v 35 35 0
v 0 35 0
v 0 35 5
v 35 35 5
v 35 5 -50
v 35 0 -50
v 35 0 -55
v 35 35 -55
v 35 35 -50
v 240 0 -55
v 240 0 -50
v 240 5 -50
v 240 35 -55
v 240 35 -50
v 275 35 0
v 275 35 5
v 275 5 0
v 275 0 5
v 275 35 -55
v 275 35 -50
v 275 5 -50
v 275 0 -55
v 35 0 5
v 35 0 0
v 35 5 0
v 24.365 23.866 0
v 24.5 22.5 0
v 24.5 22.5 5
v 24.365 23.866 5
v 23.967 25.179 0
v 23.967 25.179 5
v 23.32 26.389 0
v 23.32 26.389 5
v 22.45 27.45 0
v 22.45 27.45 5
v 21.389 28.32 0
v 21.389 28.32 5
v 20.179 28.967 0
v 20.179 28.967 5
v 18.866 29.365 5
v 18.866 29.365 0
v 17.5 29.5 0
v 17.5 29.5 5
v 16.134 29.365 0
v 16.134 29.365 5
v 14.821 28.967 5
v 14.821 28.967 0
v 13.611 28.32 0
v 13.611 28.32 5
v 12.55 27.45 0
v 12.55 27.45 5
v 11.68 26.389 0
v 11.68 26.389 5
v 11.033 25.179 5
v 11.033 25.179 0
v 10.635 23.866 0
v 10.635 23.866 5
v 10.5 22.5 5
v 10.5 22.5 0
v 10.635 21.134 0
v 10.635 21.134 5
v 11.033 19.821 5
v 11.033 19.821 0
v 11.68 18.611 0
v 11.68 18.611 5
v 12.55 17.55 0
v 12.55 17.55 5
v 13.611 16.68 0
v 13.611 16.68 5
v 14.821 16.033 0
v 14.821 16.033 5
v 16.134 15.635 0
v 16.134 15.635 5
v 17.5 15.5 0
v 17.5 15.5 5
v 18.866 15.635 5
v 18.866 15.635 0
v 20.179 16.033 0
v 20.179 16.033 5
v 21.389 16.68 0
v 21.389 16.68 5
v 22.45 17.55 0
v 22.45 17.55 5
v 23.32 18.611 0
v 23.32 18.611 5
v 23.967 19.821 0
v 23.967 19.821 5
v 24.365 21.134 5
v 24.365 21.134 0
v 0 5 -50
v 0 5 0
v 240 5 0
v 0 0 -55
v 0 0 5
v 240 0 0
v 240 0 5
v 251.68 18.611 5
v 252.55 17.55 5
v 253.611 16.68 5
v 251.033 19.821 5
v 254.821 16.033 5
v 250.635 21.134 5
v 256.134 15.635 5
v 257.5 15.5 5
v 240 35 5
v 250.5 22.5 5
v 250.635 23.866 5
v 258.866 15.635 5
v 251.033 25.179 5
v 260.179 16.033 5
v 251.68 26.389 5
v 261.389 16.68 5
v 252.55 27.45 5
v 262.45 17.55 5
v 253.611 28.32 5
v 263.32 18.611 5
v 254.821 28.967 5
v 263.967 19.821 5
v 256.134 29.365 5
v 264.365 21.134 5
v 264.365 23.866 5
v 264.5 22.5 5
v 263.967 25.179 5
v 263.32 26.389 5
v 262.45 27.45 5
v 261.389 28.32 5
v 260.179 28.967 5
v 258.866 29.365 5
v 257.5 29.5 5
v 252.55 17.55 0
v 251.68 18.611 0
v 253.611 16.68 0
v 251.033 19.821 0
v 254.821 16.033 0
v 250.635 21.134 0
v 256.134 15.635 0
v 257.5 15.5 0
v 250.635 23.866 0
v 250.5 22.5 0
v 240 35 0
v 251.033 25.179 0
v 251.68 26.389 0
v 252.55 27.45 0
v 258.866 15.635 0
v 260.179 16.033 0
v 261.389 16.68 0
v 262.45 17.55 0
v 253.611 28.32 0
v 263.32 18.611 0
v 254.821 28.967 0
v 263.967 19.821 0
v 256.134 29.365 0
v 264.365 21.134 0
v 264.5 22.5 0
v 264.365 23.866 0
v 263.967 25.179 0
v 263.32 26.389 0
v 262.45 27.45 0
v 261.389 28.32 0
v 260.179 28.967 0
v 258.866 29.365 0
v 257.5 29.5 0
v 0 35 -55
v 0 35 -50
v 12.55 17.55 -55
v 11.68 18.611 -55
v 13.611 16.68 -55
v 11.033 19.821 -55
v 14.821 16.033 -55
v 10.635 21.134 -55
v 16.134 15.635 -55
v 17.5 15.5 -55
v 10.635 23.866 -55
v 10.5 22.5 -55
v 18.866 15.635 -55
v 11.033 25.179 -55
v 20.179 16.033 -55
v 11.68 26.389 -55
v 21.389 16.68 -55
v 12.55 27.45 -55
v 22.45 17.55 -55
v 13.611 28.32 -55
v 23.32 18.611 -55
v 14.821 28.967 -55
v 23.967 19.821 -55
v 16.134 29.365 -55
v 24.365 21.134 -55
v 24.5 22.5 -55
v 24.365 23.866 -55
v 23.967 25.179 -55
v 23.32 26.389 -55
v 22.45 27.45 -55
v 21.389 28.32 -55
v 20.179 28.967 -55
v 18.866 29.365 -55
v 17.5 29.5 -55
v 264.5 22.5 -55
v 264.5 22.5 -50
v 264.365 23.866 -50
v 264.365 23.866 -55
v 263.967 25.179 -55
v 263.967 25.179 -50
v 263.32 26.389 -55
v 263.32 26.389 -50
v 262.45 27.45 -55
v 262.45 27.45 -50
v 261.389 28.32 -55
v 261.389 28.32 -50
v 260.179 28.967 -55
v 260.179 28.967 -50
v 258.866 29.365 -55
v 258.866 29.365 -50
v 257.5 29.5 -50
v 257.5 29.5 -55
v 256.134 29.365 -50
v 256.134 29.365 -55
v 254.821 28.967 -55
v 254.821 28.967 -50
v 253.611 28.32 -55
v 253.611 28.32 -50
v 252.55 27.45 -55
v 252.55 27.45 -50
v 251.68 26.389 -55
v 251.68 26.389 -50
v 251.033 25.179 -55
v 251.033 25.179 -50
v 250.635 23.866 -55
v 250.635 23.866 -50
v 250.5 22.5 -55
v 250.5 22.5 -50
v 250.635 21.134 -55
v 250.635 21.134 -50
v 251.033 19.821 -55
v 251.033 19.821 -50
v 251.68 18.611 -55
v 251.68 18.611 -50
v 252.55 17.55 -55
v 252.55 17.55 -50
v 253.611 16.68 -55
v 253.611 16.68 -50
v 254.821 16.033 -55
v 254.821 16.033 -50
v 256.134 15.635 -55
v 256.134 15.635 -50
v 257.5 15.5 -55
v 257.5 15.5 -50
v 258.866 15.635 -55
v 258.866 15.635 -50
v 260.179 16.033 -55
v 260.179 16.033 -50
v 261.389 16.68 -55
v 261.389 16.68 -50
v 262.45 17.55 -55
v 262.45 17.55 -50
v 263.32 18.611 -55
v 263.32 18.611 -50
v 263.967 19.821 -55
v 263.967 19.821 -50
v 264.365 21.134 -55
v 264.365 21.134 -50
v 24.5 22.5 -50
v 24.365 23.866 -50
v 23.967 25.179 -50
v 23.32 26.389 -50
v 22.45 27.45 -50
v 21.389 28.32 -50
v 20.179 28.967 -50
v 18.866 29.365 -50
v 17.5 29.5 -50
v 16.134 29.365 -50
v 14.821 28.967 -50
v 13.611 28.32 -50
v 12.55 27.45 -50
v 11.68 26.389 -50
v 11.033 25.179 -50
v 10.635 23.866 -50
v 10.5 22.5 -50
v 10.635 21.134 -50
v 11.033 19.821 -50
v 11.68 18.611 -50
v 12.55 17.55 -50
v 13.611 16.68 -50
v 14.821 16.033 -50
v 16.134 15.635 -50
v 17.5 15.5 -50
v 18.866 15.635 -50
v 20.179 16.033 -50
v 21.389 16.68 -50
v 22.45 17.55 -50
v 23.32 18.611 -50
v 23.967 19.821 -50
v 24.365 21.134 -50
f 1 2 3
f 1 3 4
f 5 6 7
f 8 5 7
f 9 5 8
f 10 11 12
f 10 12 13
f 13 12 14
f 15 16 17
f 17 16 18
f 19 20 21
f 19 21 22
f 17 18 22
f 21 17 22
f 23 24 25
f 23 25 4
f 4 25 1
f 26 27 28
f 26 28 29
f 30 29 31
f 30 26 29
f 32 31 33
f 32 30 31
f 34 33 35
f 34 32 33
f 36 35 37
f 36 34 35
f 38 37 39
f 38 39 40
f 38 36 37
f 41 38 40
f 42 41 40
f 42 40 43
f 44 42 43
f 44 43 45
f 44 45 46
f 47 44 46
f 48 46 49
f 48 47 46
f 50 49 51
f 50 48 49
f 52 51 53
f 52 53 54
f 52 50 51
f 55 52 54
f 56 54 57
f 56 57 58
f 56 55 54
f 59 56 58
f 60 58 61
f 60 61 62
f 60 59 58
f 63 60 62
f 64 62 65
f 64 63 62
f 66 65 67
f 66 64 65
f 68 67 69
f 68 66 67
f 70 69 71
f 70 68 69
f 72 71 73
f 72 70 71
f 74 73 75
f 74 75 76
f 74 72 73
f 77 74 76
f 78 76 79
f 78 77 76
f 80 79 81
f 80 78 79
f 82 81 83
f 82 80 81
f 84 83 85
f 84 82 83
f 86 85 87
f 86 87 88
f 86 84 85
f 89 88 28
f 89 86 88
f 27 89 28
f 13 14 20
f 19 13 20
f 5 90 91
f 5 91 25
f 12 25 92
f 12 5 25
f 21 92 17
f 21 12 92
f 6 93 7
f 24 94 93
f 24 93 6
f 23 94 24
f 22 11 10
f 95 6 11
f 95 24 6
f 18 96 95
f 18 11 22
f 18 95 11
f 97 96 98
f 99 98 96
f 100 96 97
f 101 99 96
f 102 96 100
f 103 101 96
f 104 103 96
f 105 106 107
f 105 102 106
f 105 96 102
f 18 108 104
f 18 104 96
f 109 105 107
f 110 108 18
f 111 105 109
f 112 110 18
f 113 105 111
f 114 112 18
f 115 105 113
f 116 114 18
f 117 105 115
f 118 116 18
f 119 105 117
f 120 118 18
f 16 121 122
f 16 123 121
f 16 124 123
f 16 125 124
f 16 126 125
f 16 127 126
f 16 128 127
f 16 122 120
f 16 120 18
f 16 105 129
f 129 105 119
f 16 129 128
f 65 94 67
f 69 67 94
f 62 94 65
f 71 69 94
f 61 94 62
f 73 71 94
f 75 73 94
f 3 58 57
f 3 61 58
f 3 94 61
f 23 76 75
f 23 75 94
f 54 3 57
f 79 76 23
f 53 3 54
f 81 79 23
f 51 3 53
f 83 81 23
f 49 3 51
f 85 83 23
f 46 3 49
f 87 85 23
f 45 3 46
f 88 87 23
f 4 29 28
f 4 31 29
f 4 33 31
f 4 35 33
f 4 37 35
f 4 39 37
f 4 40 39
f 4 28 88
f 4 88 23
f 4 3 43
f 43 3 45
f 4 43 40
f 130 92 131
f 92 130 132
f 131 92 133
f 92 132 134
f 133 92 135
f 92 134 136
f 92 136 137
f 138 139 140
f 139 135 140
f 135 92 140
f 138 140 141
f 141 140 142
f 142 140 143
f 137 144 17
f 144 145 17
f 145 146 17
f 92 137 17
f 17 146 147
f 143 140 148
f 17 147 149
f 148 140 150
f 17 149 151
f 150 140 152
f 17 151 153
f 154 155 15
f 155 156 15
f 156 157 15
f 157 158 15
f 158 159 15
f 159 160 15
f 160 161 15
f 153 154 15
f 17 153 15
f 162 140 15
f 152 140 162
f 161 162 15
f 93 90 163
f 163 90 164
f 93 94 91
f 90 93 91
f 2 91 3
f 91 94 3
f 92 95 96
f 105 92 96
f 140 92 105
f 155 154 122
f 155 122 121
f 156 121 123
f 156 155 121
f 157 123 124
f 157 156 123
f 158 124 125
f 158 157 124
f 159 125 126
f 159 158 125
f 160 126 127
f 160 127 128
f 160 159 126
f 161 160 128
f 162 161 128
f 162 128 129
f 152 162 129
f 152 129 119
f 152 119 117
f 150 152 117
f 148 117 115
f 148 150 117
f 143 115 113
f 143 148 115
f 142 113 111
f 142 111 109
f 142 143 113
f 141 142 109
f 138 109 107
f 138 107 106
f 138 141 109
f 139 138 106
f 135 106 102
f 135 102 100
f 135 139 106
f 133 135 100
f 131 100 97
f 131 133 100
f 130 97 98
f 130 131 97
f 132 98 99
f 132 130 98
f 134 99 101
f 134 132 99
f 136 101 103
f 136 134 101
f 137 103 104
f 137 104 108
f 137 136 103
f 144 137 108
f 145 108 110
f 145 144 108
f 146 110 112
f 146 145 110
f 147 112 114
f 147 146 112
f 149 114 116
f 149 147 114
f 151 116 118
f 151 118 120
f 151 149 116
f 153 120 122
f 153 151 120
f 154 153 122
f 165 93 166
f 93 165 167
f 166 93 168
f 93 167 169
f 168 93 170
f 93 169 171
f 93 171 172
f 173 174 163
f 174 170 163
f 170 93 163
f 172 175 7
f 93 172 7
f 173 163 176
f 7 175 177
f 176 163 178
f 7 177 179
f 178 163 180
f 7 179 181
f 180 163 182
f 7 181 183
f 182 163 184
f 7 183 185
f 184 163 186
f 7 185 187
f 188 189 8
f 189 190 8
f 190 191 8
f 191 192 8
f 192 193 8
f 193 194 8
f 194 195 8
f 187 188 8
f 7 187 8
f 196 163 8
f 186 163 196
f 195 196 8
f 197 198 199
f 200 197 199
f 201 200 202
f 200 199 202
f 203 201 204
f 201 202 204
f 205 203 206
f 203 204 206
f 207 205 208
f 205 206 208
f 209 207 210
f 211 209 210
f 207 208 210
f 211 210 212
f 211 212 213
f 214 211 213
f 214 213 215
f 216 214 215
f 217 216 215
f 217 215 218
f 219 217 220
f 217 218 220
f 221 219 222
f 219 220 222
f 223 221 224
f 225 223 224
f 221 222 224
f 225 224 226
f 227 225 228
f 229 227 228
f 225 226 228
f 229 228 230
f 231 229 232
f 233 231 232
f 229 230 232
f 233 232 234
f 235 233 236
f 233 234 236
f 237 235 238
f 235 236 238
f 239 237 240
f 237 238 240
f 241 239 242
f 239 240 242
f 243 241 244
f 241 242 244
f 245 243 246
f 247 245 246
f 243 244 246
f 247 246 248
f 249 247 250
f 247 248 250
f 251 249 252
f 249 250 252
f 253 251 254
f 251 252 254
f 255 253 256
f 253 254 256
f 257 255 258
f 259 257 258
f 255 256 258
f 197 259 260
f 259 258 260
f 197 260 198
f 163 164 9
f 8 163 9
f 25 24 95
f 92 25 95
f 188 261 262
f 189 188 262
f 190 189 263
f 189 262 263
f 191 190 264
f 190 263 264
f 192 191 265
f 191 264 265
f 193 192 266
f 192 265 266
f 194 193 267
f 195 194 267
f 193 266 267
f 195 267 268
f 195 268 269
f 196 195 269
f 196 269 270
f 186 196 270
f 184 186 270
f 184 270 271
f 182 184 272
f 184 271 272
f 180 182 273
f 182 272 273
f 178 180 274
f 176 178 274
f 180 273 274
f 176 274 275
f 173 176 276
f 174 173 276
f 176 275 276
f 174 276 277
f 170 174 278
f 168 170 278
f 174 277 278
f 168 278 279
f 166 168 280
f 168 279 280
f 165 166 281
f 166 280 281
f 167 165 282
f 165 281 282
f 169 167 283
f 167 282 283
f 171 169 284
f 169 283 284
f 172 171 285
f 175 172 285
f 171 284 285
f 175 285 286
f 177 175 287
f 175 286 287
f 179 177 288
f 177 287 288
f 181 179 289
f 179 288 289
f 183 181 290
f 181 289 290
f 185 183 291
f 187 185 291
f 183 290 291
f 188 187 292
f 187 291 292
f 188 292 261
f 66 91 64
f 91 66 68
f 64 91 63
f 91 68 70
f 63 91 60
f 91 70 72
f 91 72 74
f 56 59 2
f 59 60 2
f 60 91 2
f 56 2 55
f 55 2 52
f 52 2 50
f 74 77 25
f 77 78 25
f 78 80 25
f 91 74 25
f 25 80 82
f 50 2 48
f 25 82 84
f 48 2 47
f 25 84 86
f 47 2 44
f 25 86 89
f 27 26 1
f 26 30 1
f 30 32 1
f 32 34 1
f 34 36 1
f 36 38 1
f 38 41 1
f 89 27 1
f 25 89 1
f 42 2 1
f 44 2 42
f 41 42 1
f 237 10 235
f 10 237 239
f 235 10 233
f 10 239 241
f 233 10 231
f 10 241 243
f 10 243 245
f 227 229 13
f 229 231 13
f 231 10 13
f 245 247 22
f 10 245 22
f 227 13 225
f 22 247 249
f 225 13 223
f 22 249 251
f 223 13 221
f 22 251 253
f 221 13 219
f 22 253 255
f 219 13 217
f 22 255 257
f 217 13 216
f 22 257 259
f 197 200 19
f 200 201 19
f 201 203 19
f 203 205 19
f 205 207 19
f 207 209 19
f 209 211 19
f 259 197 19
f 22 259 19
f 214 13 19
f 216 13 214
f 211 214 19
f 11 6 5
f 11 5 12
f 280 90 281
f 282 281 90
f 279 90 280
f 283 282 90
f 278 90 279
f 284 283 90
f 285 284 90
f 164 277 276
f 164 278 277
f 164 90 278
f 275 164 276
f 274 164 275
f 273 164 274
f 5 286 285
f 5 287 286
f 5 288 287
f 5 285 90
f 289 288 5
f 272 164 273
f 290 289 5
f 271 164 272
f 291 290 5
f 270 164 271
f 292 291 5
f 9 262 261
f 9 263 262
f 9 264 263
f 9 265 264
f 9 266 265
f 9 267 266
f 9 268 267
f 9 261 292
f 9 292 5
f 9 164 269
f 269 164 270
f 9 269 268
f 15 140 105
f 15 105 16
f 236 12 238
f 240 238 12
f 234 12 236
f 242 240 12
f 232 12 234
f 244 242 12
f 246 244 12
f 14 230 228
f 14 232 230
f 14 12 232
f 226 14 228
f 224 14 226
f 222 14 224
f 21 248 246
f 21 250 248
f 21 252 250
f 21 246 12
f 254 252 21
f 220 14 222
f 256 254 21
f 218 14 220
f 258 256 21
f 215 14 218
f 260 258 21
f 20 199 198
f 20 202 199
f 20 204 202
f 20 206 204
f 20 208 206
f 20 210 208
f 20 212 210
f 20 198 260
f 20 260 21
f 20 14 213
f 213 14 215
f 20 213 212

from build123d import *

# Parameters (mm, degrees)
SZKIC1_W                    = 275
SZKIC1_H                    = 50
DODANIE_WYCI_GNI_CIE1_DEPTH = 5
SZKIC2_W                    = 35
SZKIC2_H                    = 35
SZKIC2_R                    = 7
DODANIE_WYCI_GNI_CIE2_DEPTH = 5


with BuildPart() as part:
    # Szkic1 → Dodanie-wyciągnięcie1 (new body)
    with BuildSketch(Plane(origin=(0, 0, 0), x_dir=(1, 0, 0), z_dir=(0, 1, 0))):
        with Locations((137.5, 25)):
            Rectangle(SZKIC1_W, SZKIC1_H)
    extrude(amount=DODANIE_WYCI_GNI_CIE1_DEPTH)

    # Szkic2 → Dodanie-wyciągnięcie2 (add)
    with BuildSketch(Plane.XY):
        with Locations((17.5, 17.5)):
            Rectangle(SZKIC2_W, SZKIC2_H)
        with Locations((17.5, 22.5)):
            Circle(SZKIC2_R, mode=Mode.SUBTRACT)
        with Locations((257.5, 17.5)):
            Rectangle(SZKIC2_W, SZKIC2_H)
        with Locations((257.5, 22.5)):
            Circle(SZKIC2_R, mode=Mode.SUBTRACT)
    dodanie_wyci_gni_cie2 = extrude(amount=DODANIE_WYCI_GNI_CIE2_DEPTH)

    # Lustro1: Dodanie-wyciągnięcie2 across plane
    add(dodanie_wyci_gni_cie2.mirror(Plane(origin=(0, 0, -25), x_dir=(1, 0, 0), z_dir=(0, 0, -1))))


solid = part.part
